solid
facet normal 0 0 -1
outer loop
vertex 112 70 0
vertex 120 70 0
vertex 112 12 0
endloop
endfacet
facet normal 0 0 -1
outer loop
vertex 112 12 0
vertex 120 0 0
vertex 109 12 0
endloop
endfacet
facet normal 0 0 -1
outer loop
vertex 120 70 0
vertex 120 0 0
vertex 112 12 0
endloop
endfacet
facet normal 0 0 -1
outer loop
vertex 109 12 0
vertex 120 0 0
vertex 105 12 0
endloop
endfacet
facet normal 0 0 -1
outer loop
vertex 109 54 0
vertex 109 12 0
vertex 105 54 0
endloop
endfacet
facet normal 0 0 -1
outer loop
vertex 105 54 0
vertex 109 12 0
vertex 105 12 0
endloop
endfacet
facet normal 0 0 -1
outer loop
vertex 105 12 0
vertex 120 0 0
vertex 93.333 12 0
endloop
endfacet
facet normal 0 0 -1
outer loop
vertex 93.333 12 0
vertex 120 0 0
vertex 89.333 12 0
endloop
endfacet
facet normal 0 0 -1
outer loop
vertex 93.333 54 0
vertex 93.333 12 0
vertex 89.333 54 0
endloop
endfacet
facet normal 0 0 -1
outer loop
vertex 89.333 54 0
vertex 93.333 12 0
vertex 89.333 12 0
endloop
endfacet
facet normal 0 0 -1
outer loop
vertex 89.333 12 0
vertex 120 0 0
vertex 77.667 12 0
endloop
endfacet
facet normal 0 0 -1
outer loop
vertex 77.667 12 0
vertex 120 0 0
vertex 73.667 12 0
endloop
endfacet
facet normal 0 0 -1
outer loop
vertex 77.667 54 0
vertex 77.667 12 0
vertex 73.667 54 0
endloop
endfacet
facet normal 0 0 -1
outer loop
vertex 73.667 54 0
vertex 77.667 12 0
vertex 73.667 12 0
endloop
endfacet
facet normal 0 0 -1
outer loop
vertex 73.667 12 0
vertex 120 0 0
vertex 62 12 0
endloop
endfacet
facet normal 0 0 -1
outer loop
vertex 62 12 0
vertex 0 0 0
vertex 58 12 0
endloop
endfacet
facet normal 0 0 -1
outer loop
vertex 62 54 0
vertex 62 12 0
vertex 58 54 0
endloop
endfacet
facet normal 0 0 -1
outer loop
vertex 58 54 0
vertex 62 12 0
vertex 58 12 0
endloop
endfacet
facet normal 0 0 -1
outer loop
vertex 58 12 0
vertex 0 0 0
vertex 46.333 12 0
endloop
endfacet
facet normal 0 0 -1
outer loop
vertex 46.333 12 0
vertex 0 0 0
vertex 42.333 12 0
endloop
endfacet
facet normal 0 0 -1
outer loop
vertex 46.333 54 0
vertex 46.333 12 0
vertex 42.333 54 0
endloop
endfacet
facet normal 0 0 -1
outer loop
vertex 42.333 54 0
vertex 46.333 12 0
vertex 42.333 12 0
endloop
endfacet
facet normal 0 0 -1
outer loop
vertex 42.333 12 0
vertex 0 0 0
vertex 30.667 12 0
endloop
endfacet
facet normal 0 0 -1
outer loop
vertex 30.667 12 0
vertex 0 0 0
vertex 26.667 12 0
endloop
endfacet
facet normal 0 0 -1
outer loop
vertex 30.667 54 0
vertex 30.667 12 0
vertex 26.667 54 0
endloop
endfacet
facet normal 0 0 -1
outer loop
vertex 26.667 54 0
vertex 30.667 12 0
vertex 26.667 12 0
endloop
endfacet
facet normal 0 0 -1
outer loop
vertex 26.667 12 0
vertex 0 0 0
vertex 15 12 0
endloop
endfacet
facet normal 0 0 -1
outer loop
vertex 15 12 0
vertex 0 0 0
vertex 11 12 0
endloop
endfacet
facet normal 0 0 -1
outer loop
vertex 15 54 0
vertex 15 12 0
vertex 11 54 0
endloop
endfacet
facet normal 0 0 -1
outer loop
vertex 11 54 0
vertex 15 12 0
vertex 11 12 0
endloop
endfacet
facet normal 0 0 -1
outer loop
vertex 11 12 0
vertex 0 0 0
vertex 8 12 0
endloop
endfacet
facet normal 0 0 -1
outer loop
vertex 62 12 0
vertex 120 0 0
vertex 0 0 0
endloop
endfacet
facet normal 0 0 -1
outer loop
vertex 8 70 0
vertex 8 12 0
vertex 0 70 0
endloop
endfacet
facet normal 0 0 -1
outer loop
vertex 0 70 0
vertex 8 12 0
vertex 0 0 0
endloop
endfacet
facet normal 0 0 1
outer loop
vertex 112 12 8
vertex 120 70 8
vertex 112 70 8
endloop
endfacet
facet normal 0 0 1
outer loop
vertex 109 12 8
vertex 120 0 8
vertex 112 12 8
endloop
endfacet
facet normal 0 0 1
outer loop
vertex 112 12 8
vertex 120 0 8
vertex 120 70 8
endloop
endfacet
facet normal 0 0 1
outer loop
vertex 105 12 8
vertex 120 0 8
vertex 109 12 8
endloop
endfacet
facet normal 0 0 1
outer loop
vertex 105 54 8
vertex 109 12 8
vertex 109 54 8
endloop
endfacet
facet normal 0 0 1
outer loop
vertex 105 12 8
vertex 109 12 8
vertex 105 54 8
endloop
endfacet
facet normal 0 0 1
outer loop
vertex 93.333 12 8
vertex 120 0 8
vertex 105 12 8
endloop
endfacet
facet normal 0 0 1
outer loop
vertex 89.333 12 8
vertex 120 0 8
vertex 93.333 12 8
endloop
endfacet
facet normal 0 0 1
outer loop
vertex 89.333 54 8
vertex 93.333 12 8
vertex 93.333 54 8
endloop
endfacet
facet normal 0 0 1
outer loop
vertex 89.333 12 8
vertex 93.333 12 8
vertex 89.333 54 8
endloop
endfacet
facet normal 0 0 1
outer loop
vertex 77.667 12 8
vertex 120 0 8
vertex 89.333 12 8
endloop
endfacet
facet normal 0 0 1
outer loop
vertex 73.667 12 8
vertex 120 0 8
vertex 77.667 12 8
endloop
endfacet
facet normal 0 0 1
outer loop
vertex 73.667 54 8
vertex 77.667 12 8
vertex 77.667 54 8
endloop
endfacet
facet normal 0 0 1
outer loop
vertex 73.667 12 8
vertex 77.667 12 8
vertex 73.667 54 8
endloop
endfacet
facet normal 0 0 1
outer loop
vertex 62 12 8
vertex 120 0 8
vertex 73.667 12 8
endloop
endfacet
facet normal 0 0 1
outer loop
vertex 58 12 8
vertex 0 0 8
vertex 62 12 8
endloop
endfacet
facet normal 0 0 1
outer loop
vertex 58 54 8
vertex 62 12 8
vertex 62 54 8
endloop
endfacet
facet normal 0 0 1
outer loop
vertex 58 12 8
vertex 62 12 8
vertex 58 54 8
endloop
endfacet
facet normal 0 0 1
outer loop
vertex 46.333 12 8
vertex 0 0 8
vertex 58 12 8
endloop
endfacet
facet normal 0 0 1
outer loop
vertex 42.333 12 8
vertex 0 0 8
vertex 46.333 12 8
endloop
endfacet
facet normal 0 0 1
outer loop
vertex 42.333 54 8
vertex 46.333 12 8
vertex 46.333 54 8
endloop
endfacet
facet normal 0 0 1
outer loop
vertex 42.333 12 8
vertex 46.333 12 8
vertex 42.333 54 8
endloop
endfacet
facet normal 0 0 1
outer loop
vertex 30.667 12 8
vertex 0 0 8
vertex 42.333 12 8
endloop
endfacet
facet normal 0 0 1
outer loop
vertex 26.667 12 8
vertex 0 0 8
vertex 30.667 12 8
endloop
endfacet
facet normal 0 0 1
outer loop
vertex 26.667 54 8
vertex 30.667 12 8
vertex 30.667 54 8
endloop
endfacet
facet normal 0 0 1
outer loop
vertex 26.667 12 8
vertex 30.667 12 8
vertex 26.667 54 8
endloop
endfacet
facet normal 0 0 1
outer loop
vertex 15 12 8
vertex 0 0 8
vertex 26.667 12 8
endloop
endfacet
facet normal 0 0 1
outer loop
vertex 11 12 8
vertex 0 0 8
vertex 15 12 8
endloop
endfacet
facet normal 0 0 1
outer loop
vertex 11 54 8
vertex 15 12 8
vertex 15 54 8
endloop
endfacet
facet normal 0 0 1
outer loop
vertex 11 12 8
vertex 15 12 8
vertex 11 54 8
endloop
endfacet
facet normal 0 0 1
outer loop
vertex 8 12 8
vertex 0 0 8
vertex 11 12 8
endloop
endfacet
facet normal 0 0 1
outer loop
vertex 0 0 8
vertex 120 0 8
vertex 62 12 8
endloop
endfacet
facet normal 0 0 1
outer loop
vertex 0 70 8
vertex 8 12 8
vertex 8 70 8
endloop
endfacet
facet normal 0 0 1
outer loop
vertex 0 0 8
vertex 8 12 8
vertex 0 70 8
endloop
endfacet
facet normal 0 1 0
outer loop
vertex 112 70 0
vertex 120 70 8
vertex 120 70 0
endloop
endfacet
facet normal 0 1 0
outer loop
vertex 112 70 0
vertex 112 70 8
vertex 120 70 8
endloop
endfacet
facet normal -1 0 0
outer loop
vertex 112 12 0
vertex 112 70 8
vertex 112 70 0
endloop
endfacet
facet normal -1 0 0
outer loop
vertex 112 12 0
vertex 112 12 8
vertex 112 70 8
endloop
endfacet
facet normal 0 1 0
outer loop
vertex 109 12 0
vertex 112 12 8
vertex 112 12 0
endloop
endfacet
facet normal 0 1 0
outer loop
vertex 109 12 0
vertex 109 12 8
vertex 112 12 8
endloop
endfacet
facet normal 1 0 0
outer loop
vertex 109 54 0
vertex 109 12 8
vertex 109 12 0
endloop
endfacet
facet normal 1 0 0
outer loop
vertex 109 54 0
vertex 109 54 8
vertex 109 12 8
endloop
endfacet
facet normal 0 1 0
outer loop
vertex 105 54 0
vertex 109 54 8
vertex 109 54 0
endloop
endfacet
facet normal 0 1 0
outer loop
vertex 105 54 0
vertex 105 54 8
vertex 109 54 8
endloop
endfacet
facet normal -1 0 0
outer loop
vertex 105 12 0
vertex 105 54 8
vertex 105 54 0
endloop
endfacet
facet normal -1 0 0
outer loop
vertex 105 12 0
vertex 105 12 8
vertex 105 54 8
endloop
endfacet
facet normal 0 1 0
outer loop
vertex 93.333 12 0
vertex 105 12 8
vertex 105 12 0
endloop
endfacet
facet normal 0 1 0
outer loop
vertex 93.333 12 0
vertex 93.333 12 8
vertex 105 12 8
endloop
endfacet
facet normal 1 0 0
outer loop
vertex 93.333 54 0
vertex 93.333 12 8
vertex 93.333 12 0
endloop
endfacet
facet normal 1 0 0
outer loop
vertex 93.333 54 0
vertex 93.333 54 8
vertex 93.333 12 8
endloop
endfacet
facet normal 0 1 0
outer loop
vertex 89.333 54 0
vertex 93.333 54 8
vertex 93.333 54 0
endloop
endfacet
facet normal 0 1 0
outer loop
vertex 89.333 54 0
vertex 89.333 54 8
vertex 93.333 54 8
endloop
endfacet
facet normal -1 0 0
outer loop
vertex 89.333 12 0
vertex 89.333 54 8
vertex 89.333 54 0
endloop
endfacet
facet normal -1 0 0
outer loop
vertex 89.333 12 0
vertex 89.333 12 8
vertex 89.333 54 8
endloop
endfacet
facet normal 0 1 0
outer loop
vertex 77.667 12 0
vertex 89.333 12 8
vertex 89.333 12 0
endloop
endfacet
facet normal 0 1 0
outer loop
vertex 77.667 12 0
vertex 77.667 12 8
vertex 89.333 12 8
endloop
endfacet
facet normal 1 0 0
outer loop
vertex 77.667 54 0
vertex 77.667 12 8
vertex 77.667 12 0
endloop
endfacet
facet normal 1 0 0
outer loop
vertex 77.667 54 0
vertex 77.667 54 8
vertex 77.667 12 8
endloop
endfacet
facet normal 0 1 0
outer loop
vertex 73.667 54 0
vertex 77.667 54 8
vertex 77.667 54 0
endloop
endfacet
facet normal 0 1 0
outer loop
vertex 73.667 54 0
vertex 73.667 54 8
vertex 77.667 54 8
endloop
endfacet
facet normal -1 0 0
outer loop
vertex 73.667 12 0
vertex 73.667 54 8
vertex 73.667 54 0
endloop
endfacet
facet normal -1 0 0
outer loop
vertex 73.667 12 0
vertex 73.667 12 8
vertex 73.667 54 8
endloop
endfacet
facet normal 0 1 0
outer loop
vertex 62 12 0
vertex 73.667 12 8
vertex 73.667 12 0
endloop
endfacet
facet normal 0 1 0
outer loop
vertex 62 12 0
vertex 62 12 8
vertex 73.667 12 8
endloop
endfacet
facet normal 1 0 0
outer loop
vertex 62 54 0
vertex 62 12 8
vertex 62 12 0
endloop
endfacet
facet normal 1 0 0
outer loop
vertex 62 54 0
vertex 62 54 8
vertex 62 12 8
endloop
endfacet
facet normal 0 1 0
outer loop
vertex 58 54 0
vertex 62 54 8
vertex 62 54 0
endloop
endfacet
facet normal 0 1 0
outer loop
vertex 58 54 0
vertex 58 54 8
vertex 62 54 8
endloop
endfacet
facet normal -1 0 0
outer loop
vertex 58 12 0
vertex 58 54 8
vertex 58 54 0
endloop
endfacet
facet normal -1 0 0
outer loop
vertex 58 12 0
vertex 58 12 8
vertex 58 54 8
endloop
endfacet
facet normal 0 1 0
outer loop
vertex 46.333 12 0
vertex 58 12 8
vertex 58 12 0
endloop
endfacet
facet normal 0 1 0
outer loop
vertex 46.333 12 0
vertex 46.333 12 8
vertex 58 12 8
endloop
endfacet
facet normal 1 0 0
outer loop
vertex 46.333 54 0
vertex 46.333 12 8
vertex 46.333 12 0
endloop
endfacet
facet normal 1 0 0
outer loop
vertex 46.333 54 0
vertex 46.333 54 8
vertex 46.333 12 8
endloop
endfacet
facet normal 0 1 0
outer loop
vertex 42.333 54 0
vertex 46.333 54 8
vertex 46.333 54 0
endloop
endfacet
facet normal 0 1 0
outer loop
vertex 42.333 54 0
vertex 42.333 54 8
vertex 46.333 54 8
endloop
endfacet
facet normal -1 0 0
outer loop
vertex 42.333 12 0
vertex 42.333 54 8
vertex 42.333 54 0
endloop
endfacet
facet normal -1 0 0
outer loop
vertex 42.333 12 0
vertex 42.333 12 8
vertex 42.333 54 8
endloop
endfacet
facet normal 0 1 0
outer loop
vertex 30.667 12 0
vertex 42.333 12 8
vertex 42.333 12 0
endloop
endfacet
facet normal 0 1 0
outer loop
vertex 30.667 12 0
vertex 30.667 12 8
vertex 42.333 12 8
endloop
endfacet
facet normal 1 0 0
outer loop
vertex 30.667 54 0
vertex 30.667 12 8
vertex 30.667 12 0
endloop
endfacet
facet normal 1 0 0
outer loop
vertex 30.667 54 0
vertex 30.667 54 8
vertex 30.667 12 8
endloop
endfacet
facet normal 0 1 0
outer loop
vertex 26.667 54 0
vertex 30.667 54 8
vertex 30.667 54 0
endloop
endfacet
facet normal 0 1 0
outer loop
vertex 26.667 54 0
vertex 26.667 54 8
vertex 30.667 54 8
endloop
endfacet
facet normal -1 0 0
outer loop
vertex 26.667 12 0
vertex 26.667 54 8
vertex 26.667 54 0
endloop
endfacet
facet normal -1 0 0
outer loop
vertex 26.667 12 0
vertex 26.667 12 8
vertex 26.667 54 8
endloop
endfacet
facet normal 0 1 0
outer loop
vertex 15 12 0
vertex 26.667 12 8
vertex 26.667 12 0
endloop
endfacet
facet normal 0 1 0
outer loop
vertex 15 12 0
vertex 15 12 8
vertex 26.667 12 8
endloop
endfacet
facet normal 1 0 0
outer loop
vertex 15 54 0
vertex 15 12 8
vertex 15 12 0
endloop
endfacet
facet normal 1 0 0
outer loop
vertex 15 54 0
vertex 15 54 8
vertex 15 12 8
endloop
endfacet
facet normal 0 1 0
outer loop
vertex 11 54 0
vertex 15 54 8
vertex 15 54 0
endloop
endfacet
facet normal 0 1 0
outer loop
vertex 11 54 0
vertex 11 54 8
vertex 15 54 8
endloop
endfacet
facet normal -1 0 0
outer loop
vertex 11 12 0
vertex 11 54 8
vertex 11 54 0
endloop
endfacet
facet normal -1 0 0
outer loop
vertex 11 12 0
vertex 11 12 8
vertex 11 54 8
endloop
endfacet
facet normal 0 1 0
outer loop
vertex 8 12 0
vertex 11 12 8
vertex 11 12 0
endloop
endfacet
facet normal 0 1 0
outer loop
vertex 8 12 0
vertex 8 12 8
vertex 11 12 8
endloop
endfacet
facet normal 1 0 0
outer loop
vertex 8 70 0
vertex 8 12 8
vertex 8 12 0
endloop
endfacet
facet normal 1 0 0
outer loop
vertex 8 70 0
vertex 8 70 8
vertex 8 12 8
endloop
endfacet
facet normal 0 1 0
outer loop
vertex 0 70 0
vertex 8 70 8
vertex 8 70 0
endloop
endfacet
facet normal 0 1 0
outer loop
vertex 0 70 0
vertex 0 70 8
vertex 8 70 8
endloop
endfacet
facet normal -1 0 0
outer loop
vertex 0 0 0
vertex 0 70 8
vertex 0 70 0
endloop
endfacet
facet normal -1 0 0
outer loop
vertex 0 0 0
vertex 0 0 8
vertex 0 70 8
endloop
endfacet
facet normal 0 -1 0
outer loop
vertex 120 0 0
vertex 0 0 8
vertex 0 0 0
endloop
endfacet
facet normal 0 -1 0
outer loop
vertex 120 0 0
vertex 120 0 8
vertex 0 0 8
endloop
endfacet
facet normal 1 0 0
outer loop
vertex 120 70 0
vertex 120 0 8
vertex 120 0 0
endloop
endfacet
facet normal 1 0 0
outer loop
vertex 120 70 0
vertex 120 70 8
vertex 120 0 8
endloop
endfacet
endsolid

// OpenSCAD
$fn = 32;

// ----------------------------------------------------------------------
// Guard grille: 7 slats over a 120 x 70 mm plate
// ----------------------------------------------------------------------

// --- parameters (mm) ---
profile_height = 8;       // extrusion height
profile_points = 36;      // points of the closed outline

profile = [[0, 0], [120, 0], [120, 70], [112, 70], [112, 12], [109, 12], [109, 54], [105, 54], [105, 12], [93.333, 12], [93.333, 54], [89.333, 54], [89.333, 12], [77.667, 12], [77.667, 54], [73.667, 54], [73.667, 12], [62, 12], [62, 54], [58, 54], [58, 12], [46.333, 12], [46.333, 54], [42.333, 54], [42.333, 12], [30.667, 12], [30.667, 54], [26.667, 54], [26.667, 12], [15, 12], [15, 54], [11, 54], [11, 12], [8, 12], [8, 70], [0, 70]];  // single closed polygon, 36 points, counter clockwise

// --- the one profile operation ---
linear_extrude(height = profile_height) polygon(points = profile);
